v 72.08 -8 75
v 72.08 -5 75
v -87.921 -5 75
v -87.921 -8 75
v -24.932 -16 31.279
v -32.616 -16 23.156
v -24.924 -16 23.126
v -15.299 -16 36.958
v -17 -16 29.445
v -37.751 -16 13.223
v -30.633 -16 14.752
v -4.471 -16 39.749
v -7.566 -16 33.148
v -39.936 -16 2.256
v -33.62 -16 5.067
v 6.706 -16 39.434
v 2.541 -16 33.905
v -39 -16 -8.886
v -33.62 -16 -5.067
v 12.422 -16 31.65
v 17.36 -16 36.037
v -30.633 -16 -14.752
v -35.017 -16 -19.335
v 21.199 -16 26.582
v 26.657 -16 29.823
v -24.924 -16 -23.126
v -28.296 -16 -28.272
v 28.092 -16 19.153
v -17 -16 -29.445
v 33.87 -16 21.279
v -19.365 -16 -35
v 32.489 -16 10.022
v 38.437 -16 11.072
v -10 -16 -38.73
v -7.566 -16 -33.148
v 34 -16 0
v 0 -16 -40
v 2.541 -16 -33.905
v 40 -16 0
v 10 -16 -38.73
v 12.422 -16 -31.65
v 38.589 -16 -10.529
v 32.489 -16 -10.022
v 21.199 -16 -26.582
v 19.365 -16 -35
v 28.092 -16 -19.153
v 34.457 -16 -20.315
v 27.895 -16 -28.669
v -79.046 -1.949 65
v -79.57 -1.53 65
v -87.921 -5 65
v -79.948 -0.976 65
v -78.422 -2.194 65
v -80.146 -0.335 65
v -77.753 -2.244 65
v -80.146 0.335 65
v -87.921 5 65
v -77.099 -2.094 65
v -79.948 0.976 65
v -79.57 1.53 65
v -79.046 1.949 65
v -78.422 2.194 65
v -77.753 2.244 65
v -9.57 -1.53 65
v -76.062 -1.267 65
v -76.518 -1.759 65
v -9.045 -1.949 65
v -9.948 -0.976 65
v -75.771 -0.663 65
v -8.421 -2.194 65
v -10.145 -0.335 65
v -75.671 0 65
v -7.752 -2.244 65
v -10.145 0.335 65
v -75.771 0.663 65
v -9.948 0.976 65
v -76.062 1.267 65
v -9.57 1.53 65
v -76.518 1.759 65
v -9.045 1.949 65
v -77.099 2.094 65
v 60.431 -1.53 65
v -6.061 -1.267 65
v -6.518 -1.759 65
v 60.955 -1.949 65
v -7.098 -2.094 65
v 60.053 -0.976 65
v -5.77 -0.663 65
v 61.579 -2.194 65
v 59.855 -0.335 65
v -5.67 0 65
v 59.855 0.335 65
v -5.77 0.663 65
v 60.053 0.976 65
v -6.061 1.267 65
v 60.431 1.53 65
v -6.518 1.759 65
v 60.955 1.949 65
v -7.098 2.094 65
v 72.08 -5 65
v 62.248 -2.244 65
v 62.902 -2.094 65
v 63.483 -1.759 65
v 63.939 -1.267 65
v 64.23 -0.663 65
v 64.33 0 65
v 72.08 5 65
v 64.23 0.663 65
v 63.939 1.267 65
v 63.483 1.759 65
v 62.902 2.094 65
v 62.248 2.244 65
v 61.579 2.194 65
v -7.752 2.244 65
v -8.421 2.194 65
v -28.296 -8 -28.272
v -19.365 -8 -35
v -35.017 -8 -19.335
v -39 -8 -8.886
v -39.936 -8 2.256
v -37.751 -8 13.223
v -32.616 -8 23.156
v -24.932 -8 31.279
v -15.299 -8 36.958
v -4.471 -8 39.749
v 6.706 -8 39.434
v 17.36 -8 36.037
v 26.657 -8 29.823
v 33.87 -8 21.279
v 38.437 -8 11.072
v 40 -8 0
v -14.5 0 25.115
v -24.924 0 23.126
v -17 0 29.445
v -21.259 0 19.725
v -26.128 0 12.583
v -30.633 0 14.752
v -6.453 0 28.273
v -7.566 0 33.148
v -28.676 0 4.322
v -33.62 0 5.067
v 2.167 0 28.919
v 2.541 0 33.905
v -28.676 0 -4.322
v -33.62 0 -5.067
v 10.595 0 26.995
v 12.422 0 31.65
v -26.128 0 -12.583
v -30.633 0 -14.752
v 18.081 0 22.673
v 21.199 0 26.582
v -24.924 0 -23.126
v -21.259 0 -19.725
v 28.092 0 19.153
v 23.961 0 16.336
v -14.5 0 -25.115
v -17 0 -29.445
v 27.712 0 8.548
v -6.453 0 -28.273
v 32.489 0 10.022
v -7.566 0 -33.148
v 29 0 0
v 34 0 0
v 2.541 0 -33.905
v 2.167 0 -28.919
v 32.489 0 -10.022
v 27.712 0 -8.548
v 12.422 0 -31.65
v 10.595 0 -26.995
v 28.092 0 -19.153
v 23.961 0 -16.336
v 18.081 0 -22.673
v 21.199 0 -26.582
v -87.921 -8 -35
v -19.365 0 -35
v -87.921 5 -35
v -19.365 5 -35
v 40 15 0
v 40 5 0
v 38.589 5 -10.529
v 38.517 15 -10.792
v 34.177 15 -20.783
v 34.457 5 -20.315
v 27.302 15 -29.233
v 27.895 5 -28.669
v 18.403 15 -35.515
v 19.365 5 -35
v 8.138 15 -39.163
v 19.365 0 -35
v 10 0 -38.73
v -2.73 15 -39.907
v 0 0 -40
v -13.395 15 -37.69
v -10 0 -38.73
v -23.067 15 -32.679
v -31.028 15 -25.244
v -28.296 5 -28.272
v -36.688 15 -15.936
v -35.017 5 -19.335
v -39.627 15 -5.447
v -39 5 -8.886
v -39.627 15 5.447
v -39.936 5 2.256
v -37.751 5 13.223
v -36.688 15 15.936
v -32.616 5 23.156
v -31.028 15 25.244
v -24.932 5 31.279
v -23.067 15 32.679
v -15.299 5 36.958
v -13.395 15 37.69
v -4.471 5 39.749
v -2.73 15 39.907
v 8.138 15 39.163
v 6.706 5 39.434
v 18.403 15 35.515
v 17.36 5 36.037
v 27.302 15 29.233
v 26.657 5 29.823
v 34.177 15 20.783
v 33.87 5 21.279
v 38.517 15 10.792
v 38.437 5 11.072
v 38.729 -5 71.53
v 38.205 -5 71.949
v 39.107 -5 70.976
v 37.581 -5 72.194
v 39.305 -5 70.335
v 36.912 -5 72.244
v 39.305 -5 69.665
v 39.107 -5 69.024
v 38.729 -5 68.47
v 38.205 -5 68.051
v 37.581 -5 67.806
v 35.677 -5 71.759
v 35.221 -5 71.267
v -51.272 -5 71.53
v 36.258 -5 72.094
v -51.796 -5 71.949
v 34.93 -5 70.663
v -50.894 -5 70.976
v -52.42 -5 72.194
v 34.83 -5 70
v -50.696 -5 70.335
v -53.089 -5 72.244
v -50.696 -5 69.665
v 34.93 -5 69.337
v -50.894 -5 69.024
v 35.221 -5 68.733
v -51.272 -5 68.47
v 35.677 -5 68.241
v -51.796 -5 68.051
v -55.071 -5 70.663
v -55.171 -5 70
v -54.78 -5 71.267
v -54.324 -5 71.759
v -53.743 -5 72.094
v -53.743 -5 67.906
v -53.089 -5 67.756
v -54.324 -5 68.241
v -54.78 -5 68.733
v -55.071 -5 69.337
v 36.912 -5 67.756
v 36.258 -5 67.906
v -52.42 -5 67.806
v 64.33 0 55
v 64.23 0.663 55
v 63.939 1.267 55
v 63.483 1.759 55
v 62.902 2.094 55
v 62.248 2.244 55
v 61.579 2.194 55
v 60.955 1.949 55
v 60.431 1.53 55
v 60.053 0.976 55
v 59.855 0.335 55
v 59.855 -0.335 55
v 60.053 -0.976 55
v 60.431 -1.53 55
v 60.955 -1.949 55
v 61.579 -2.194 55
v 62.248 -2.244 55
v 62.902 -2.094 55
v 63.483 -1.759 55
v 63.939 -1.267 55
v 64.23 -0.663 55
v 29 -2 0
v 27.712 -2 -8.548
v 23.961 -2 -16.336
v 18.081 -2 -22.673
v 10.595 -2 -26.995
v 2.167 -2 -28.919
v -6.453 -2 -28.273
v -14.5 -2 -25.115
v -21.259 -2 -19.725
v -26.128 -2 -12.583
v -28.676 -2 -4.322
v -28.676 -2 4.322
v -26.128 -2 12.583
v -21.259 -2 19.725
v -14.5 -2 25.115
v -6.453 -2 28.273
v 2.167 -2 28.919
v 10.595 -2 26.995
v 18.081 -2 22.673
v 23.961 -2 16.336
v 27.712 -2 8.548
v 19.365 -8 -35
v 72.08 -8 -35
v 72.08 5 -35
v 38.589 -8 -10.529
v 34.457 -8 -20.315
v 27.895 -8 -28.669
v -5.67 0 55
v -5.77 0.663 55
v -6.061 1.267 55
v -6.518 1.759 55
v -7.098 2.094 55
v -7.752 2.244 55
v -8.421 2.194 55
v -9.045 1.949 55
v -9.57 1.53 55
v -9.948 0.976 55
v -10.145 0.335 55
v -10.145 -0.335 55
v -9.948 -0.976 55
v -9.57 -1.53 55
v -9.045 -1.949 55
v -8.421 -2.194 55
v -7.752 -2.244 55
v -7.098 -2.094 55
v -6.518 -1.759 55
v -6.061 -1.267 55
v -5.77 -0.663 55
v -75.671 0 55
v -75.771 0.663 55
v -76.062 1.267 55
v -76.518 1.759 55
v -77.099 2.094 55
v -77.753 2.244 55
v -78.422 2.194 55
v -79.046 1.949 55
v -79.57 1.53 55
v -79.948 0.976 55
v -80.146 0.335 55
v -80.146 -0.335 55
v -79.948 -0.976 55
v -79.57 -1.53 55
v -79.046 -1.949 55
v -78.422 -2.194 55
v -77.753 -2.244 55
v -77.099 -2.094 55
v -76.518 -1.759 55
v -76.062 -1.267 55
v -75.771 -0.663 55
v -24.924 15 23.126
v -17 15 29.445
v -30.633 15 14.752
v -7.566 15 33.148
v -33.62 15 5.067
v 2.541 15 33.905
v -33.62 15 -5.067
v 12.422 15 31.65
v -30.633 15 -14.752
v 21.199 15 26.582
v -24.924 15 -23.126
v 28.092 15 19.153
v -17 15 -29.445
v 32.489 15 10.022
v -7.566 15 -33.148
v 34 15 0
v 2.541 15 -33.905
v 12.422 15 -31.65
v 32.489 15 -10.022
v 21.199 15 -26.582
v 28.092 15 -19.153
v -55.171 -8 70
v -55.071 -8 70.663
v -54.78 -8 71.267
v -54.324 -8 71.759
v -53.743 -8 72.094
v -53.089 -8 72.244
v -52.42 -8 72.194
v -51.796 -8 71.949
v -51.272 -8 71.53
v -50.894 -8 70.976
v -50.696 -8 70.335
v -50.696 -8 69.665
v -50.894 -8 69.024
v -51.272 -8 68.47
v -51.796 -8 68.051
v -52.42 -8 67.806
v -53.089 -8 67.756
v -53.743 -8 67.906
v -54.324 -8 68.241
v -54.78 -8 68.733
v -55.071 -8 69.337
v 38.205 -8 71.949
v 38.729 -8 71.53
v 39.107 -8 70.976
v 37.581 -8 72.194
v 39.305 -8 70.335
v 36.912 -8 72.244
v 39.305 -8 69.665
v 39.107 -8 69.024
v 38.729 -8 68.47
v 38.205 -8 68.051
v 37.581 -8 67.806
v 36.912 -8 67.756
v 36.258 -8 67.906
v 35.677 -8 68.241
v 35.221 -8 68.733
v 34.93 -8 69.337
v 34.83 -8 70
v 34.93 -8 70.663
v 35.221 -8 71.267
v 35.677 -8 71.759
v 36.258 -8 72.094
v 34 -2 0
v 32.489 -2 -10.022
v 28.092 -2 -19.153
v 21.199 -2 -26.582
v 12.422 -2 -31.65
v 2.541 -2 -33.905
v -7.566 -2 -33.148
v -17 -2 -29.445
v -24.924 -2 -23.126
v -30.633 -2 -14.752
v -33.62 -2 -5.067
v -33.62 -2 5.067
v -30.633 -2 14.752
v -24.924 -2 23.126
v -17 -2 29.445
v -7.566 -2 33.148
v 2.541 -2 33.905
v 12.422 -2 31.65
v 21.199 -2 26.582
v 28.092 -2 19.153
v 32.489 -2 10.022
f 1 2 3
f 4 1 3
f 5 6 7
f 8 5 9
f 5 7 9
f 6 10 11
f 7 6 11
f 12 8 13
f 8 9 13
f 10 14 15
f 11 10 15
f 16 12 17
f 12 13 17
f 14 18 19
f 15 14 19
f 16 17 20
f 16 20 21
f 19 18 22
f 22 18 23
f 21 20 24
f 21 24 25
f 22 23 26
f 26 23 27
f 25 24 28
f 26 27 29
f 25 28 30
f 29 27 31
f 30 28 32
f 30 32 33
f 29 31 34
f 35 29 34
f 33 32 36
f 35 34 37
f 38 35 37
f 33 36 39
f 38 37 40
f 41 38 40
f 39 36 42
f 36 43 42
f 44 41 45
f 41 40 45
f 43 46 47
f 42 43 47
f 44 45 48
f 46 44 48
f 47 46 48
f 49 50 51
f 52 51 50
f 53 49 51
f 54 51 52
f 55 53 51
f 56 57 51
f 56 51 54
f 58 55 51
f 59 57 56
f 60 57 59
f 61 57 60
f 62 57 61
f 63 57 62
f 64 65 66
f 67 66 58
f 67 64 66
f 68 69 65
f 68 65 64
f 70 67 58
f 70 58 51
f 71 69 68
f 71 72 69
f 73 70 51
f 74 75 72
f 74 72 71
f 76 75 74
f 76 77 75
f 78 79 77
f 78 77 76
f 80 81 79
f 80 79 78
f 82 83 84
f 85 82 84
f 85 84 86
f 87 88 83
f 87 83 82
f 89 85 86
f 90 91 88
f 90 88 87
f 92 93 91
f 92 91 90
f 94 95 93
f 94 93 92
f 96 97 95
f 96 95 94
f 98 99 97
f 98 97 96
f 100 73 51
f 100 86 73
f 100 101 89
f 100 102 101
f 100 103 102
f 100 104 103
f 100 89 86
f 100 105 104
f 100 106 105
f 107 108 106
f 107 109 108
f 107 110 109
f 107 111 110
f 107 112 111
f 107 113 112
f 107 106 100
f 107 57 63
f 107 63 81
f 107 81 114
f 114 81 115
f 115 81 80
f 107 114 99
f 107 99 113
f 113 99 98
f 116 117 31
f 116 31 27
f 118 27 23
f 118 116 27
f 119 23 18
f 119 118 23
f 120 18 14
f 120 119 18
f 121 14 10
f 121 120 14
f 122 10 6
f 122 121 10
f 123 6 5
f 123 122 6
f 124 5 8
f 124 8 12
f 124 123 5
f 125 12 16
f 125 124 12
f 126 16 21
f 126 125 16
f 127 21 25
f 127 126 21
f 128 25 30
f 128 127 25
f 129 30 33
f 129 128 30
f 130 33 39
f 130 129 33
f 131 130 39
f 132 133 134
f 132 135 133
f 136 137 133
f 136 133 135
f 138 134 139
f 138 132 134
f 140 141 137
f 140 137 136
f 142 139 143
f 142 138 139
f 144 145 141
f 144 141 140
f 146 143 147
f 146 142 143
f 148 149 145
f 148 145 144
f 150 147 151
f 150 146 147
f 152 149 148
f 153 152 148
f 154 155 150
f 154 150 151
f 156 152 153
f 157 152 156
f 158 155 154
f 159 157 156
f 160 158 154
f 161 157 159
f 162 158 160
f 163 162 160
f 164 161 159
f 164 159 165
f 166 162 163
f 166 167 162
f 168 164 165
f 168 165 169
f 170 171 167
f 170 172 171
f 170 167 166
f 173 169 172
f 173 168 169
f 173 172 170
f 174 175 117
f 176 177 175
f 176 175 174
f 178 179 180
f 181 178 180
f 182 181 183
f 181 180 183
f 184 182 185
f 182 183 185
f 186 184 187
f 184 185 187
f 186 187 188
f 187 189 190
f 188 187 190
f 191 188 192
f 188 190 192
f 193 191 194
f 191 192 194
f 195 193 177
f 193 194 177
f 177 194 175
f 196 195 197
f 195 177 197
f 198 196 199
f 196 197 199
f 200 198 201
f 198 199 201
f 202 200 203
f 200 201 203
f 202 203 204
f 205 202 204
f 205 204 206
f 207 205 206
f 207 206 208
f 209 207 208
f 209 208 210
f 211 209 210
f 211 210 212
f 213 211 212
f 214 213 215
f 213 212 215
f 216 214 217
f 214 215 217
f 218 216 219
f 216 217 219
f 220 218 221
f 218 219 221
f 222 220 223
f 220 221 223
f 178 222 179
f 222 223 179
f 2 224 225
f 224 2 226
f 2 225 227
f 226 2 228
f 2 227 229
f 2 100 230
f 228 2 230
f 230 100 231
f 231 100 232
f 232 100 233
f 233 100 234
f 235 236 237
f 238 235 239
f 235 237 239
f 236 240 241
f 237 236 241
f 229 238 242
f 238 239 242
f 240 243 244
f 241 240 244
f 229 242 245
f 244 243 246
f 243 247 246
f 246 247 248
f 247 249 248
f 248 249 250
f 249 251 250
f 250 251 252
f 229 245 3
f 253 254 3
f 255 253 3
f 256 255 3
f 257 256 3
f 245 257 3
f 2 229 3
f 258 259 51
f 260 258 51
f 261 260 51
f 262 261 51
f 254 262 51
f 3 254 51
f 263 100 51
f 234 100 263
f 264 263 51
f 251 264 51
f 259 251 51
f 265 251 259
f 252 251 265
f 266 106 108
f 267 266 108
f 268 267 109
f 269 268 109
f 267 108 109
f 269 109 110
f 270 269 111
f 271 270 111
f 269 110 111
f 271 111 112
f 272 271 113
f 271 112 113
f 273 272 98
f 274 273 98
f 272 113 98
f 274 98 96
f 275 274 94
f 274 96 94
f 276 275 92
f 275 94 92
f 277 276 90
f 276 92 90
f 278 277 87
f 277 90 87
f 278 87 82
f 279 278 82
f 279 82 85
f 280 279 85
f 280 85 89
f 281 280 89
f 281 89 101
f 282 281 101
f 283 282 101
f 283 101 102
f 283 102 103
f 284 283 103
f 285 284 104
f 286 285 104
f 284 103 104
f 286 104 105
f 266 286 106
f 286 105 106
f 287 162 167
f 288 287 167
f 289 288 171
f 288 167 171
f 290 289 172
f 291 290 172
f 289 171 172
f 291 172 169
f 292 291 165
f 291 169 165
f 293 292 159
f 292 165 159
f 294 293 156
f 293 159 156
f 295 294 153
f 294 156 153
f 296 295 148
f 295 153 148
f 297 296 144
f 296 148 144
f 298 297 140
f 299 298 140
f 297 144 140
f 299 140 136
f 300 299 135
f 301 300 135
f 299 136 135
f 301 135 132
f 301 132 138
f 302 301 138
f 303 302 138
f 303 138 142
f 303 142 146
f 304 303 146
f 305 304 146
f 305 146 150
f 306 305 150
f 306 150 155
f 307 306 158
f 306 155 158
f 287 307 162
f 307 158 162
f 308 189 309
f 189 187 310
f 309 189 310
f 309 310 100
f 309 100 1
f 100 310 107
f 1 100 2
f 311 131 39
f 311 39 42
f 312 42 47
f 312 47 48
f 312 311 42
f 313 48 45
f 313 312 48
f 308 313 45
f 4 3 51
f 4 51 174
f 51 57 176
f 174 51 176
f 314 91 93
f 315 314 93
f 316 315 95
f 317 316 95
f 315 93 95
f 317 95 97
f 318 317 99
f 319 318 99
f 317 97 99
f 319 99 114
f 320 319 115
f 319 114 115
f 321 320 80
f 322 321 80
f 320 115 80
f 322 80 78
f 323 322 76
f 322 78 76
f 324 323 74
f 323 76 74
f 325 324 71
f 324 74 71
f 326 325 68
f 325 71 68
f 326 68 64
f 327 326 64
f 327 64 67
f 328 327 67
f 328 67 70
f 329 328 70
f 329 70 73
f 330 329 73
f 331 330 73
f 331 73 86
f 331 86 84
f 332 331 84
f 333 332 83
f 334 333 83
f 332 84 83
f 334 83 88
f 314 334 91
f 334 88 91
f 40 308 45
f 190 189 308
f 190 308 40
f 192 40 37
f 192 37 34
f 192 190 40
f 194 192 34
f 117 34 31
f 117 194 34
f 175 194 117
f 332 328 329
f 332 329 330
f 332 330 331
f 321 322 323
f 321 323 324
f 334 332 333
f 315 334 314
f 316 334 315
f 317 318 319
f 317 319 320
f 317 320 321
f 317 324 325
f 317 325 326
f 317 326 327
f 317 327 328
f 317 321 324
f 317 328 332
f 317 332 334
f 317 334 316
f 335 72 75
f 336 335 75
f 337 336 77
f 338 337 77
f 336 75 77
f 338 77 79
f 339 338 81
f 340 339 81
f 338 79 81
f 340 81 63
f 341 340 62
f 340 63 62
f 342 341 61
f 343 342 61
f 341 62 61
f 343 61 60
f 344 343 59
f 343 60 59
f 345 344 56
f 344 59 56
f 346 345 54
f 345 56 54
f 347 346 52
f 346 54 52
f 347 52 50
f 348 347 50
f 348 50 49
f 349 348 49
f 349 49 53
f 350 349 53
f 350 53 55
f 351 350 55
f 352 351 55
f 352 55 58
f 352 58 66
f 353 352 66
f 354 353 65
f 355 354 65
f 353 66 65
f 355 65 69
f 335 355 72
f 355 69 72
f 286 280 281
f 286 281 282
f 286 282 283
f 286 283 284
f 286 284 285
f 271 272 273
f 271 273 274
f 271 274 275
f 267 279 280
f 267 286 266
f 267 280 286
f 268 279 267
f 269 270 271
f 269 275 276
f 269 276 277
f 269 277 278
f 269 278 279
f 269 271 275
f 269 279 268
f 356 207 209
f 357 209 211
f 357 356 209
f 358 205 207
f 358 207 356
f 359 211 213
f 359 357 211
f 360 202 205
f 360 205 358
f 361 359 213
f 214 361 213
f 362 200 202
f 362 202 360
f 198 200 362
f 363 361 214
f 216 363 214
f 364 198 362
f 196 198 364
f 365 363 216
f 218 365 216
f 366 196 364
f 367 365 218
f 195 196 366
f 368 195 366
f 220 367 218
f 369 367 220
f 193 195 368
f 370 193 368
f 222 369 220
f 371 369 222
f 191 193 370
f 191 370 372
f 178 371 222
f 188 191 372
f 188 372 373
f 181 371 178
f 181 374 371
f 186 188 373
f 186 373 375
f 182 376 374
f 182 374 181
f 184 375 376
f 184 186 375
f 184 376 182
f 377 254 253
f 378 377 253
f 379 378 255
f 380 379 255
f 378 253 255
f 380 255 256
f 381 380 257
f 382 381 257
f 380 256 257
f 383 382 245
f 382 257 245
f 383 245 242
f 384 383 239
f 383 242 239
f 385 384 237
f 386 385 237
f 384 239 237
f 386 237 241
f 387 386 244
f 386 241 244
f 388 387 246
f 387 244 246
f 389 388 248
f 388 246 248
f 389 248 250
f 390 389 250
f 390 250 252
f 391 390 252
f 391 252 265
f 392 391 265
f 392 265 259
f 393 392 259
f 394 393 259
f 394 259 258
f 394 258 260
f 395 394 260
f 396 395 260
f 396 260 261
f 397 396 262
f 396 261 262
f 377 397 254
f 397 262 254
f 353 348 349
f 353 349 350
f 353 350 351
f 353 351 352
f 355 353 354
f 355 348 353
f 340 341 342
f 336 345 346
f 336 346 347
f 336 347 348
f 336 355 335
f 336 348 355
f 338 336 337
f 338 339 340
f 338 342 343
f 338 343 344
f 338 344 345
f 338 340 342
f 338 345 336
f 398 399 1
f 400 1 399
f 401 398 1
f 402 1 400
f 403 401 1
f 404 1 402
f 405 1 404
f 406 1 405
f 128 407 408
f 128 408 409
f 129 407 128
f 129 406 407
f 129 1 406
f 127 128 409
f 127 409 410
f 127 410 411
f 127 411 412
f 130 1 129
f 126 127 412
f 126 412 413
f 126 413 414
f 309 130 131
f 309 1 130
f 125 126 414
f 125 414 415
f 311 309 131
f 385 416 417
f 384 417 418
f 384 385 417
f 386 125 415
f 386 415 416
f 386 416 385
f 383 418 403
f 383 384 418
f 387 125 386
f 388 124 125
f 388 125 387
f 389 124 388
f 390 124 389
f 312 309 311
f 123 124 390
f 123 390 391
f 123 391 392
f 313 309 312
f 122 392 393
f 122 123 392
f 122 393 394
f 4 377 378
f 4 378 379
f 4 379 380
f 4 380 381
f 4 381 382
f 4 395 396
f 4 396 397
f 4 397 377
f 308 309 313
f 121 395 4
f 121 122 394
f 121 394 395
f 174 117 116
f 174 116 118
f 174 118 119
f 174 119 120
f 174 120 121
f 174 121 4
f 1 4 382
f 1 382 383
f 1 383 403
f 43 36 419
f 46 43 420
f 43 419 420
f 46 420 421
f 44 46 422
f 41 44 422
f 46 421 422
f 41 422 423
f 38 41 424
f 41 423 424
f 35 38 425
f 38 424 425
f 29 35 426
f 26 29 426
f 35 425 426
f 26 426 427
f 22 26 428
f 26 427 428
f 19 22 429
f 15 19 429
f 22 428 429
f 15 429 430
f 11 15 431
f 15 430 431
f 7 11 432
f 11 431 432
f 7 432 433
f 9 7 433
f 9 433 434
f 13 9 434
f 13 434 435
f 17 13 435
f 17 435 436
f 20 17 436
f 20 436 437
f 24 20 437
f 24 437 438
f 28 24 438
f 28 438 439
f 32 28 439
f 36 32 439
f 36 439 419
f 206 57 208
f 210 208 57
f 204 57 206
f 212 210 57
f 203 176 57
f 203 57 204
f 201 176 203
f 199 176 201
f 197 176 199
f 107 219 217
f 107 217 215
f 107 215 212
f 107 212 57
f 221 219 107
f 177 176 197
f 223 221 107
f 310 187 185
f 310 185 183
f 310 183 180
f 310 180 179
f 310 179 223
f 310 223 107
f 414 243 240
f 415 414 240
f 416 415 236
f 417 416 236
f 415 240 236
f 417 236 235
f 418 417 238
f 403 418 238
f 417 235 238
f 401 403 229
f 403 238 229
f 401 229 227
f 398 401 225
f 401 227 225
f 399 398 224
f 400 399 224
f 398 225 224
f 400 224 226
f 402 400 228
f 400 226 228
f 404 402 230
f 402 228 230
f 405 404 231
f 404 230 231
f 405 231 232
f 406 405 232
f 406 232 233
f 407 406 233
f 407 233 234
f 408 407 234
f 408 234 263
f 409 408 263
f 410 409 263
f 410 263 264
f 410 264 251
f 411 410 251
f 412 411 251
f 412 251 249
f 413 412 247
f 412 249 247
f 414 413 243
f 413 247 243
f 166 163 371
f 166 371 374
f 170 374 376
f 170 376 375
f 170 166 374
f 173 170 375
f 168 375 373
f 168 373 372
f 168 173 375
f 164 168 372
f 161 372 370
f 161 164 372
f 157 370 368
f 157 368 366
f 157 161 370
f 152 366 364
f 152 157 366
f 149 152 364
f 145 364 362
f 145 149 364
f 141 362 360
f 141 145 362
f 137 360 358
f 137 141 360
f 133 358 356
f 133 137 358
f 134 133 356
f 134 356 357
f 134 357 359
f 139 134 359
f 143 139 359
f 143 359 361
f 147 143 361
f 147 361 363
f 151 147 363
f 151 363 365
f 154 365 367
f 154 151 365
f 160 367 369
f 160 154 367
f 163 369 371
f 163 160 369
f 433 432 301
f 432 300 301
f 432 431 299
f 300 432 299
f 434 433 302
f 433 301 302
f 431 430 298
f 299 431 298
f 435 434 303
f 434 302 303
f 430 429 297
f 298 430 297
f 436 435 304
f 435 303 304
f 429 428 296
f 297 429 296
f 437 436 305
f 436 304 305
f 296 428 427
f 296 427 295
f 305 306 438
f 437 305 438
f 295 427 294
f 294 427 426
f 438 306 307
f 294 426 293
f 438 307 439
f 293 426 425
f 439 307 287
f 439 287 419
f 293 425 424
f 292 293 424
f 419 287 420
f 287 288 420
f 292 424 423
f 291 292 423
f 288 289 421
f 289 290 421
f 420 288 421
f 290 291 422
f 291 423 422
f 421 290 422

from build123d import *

# Parameters (mm, degrees)
SKETCH1_R                = 40
SKETCH1_R_2              = 34
BOSS_EXTRUDE1_DEPTH      = 15
SKETCH1_3_R              = 34
BOSS_EXTRUDE2_DEPTH      = 16
SKETCH1_4_R              = 34
SKETCH1_4_R_2            = 29
BOSS_EXTRUDE3_DEPTH      = 2
BOSS_EXTRUDE4_DEPTH      = 5
BOSS_EXTRUDE4_DEPTH_BACK = 5
SKETCH2_R                = 2.25
CUT_EXTRUDE1_DEPTH       = 10
BOSS_EXTRUDE5_START      = -10
BOSS_EXTRUDE5_DEPTH      = 3
SKETCH4_R                = 2.25
CUT_EXTRUDE3_DEPTH       = 3


with BuildPart() as part:
    # Sketch1 → Boss-Extrude1 (new body)
    with BuildSketch(Plane(origin=(0, 0, 0), x_dir=(1, 0, 0), z_dir=(0, 1, 0))):
        Circle(SKETCH1_R)
        Circle(SKETCH1_R_2, mode=Mode.SUBTRACT)
    extrude(amount=BOSS_EXTRUDE1_DEPTH)

    # Sketch1<3> → Boss-Extrude2 (add)
    with BuildSketch(Plane(origin=(0, 0, 0), x_dir=(1, 0, 0), z_dir=(0, 1, 0))):
        with BuildLine():
            ThreePointArc((19.364916731, 35), (0, 40), (-19.364916731, 35))
            ThreePointArc((-19.364916731, 35), (-20.315060063, -34.457195687), (40, 0))
            ThreePointArc((40, 0), (34.457195687, 20.315060063), (19.364916731, 35))
        make_face()
        Circle(SKETCH1_3_R, mode=Mode.SUBTRACT)
    extrude(amount=-BOSS_EXTRUDE2_DEPTH)

    # Sketch1<4> → Boss-Extrude3 (add)
    with BuildSketch(Plane(origin=(0, 0, 0), x_dir=(1, 0, 0), z_dir=(0, 1, 0))):
        Circle(SKETCH1_4_R)
        Circle(SKETCH1_4_R_2, mode=Mode.SUBTRACT)
    extrude(amount=-BOSS_EXTRUDE3_DEPTH)

    # Sketch1<5> → Boss-Extrude4 (add, two sides)
    with BuildSketch(Plane(origin=(0, 0, 0), x_dir=(1, 0, 0), z_dir=(0, 1, 0))) as boss_extrude4_sk:
        with BuildLine():
            Line((-19.364916731, 35), (-27.080992435, 35))
            Line((-27.080992435, 35), (-77.920992435, 35))
            Line((-77.920992435, 35), (-87.920992435, 35))
            Line((-87.920992435, 35), (-87.920992435, -65))
            Line((-87.920992435, -65), (-77.920992435, -65))
            Line((-77.920992435, -65), (0, -65))
            Line((0, -65), (72.08, -65))
            Line((72.08, -65), (72.08, 35))
            Line((72.08, 35), (37.080992435, 35))
            Line((37.080992435, 35), (19.364916731, 35))
            ThreePointArc((19.364916731, 35), (34.457195687, 20.315060063), (40, 0))
            ThreePointArc((40, 0), (-20.315060063, -34.457195687), (-19.364916731, 35))
        make_face()
    extrude(amount=BOSS_EXTRUDE4_DEPTH)
    extrude(boss_extrude4_sk.sketch, amount=-BOSS_EXTRUDE4_DEPTH_BACK)

    # Sketch2 → Cut-Extrude1 (cut)
    with BuildSketch(Plane.XY.offset(65)):
        with Locations((-77.920992435, 0)):
            Circle(SKETCH2_R)
        with Locations((-7.920496218, 0)):
            Circle(SKETCH2_R)
        with Locations((62.08, 0)):
            Circle(SKETCH2_R)
    extrude(amount=-CUT_EXTRUDE1_DEPTH, mode=Mode.SUBTRACT)

    # Sketch3 → Boss-Extrude5 (add)
    with BuildSketch(Plane(origin=(0, 5, 0), x_dir=(1, 0, 0), z_dir=(0, 1, 0)).offset(BOSS_EXTRUDE5_START)):
        with BuildLine():
            Line((19.364916731, 35), (62.079007565, 35))
            Line((62.079007565, 35), (72.08, 35))
            Line((72.08, 35), (72.08, -75))
            Line((72.08, -75), (62.079007565, -75))
            Line((62.079007565, -75), (-77.920992435, -75))
            Line((-77.920992435, -75), (-87.920992435, -75))
            Line((-87.920992435, -75), (-87.920992435, 35))
            Line((-87.920992435, 35), (-19.364916731, 35))
            ThreePointArc((-19.364916731, 35), (0, -40), (19.364916731, 35))
        make_face()
    extrude(amount=-BOSS_EXTRUDE5_DEPTH)

    # Sketch4 → Cut-Extrude3 (cut)
    with BuildSketch(Plane(origin=(0, -5, 0), x_dir=(-1, 0, 0), z_dir=(0, 1, 0))):
        with Locations((52.920992435, 70)):
            Circle(SKETCH4_R)
        with Locations((-37.08, 70)):
            Circle(SKETCH4_R)
    extrude(amount=-CUT_EXTRUDE3_DEPTH, mode=Mode.SUBTRACT)


solid = part.part
